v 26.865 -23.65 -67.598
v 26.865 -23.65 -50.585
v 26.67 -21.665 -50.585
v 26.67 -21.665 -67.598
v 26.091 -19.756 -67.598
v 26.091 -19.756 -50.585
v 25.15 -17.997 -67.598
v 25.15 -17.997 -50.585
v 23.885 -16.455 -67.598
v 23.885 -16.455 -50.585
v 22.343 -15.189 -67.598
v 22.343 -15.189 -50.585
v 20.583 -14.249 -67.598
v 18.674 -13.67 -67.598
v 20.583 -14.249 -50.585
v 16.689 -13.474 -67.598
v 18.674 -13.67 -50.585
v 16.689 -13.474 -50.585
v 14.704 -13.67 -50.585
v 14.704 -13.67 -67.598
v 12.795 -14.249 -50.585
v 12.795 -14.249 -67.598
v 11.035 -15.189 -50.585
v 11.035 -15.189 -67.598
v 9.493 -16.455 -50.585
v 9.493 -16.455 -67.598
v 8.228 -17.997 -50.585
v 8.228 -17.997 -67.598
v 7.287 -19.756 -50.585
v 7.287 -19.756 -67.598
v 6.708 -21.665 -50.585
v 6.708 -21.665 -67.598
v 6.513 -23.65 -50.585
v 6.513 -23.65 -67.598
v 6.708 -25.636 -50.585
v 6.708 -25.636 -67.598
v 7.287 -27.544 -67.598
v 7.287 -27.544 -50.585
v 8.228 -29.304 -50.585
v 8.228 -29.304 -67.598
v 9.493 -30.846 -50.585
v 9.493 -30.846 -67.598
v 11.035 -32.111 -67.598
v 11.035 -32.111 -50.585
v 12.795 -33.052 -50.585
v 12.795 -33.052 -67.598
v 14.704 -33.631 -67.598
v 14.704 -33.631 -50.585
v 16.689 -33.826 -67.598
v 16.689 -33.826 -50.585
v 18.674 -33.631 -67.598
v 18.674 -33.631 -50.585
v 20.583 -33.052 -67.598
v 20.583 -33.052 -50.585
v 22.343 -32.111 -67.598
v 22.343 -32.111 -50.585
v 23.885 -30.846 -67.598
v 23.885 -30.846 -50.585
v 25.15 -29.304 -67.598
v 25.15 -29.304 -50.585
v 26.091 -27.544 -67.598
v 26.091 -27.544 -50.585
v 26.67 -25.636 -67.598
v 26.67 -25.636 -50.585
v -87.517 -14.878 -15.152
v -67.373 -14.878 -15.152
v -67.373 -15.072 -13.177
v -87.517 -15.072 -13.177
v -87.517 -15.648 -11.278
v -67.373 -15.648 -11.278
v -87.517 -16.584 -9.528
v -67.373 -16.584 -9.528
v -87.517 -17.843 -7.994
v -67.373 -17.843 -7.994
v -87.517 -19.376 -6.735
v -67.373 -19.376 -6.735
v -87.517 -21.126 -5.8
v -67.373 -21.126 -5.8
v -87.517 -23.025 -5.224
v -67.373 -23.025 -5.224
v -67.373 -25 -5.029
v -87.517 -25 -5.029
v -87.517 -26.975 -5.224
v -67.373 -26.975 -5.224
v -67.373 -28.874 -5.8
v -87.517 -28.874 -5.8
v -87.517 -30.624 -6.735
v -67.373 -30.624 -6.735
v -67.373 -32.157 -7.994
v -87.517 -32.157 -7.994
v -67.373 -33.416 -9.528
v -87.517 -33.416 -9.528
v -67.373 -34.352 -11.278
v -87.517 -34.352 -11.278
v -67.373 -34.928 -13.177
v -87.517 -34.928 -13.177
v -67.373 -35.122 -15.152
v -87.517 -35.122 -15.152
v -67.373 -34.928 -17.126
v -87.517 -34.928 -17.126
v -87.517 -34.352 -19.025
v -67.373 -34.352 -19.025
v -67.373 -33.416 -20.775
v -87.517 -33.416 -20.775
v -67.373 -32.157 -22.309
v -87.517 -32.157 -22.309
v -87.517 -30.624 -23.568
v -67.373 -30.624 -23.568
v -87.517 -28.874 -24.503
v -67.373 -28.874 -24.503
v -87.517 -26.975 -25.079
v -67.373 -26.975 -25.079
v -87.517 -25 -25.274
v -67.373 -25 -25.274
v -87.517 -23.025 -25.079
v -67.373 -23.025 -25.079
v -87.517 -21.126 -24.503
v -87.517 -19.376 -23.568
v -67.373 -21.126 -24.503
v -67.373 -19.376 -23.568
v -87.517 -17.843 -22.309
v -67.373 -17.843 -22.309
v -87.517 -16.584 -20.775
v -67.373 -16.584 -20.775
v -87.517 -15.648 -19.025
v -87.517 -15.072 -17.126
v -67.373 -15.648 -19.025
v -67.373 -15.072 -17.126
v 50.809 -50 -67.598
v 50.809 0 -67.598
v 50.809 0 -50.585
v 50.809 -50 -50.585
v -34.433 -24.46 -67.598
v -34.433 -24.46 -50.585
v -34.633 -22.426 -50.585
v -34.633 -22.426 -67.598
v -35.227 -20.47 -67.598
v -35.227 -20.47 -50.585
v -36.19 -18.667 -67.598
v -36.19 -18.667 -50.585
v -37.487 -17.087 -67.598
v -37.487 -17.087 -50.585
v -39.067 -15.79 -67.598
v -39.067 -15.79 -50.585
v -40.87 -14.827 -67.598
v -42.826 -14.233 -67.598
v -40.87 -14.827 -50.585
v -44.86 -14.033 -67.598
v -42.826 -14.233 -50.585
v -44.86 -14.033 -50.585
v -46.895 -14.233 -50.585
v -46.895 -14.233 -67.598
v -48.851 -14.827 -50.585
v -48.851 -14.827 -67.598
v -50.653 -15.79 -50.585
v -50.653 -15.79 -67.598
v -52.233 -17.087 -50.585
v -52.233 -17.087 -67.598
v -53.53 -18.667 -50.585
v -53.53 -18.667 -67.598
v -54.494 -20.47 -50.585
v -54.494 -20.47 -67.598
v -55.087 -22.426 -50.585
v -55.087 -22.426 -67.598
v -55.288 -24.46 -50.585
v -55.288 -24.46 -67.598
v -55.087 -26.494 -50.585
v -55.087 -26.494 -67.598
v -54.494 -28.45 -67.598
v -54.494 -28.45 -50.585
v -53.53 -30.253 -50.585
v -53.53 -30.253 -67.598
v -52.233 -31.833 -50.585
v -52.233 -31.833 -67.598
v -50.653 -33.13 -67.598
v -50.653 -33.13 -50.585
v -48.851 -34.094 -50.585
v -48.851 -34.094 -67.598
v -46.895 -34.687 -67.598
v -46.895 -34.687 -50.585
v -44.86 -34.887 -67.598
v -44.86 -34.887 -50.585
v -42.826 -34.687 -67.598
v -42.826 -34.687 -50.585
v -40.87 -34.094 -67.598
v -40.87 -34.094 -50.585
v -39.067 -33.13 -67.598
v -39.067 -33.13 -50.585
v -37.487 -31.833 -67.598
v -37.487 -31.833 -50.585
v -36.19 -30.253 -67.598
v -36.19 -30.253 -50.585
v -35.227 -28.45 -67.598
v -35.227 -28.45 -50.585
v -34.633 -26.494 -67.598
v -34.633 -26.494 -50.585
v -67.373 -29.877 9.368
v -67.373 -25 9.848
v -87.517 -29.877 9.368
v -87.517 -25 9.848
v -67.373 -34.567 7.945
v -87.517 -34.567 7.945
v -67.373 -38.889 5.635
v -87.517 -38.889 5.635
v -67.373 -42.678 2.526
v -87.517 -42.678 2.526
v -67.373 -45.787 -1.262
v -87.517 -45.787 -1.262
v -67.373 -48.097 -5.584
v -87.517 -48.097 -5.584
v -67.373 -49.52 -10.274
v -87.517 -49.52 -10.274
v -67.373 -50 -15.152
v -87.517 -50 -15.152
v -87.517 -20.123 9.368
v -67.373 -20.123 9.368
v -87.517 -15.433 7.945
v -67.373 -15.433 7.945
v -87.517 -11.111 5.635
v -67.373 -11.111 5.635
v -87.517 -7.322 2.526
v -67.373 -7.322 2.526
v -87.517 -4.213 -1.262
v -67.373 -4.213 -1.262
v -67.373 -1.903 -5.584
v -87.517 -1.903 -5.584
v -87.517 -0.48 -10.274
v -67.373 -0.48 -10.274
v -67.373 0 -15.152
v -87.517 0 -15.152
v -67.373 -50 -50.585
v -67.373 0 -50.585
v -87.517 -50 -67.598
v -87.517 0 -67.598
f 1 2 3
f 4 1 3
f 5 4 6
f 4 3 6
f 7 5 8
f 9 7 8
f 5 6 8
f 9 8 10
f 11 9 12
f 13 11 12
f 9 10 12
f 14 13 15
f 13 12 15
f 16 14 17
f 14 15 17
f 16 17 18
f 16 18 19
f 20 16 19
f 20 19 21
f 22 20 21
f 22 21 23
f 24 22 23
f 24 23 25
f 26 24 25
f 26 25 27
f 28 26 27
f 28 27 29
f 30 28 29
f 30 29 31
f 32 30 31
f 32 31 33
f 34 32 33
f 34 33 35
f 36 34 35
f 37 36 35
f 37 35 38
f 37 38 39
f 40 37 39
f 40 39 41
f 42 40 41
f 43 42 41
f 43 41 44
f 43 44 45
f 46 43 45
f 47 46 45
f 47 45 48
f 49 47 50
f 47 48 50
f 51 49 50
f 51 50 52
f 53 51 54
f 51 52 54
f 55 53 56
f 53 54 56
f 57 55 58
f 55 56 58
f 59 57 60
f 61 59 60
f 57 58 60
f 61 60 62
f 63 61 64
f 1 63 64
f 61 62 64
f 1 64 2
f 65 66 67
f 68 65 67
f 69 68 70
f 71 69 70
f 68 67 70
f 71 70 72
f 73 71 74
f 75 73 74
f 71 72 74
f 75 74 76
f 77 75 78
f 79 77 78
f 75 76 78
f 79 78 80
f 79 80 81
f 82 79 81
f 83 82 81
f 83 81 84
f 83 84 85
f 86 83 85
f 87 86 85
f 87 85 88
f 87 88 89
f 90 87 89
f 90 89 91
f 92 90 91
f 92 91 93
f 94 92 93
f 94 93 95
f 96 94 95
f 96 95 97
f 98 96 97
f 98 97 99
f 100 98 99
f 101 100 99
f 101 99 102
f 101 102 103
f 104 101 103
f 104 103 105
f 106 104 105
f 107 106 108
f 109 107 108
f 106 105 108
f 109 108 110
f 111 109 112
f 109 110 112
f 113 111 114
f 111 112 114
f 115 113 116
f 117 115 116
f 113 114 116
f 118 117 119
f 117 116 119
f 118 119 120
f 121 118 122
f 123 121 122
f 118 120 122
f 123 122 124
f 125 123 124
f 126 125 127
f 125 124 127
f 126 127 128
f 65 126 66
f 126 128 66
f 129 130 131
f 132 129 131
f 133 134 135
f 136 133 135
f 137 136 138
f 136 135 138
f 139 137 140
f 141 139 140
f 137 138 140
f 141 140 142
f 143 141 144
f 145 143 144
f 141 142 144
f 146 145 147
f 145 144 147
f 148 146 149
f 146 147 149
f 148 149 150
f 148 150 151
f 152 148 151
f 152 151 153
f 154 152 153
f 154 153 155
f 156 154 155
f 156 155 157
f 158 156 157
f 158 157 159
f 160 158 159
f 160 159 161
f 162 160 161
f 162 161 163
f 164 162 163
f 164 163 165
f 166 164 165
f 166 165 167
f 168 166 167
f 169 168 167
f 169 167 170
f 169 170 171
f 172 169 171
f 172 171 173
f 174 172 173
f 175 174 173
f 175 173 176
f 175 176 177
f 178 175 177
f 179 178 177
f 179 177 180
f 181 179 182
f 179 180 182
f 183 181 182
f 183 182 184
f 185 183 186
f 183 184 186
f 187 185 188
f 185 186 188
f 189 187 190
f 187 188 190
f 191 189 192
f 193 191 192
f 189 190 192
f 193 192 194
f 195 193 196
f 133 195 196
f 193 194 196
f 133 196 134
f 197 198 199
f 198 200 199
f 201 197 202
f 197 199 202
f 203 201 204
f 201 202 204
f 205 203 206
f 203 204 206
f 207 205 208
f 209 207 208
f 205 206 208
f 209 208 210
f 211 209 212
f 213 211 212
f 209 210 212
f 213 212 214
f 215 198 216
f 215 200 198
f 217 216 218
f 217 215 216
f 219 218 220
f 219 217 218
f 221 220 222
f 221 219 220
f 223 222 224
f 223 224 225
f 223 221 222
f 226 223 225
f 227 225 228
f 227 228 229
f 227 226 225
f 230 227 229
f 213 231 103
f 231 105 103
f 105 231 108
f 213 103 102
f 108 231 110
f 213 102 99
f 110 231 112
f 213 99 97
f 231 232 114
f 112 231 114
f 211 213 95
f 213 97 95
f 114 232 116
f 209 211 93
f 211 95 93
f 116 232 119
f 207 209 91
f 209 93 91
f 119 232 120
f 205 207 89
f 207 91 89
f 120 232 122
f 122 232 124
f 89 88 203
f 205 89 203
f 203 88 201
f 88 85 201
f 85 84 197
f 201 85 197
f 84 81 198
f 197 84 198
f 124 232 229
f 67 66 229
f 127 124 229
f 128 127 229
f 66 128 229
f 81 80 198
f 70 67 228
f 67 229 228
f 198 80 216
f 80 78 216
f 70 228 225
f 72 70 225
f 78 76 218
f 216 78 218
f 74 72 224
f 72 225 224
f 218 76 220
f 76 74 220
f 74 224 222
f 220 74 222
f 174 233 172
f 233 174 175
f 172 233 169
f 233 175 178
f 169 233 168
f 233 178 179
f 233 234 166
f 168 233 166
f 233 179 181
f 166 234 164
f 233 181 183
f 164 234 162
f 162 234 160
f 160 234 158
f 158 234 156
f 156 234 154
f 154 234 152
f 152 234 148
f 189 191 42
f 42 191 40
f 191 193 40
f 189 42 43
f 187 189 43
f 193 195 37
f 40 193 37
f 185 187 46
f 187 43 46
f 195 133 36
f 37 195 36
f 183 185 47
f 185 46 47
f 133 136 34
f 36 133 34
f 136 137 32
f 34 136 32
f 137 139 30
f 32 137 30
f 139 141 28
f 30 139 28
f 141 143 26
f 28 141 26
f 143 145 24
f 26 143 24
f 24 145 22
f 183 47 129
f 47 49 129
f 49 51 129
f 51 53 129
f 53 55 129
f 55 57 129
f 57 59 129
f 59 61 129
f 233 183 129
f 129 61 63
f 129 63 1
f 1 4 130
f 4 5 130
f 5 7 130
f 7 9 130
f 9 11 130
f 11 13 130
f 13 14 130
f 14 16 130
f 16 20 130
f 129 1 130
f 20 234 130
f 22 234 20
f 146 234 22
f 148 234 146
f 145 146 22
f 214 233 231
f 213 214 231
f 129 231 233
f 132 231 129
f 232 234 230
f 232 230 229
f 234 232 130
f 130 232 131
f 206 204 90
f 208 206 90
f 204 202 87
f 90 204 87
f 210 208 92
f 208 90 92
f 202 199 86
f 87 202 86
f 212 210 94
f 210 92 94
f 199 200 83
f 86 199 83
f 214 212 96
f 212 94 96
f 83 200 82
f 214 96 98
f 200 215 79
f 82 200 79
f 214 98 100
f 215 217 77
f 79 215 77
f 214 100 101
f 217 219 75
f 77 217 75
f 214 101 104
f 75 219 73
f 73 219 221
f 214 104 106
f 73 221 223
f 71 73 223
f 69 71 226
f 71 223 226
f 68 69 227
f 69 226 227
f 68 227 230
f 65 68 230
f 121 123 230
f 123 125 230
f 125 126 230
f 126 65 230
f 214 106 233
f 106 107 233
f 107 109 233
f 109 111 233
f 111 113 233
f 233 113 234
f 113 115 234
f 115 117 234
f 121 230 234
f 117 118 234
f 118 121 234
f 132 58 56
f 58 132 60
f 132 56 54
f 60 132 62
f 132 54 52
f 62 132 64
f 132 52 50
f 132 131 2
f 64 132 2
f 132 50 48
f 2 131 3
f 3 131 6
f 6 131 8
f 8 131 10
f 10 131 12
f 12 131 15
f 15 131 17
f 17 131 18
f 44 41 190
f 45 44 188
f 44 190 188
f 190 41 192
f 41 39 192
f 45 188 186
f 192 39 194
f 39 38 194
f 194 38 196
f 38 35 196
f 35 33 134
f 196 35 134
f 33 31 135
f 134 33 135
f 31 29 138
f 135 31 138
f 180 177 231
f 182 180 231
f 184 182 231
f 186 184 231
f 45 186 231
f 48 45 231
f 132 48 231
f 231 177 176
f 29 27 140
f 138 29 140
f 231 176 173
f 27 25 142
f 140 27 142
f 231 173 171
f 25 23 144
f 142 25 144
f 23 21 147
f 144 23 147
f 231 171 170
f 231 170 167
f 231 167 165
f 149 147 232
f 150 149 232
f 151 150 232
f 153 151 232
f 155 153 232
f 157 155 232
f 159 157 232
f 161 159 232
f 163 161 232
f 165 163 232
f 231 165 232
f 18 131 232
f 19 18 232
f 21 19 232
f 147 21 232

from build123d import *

# Parameters (mm, degrees)
F1_DEPTH = 50
F2_R     = 24.99999
F3_R     = 10.4273095681
F3_R_2   = 10.1761827098
F4_DEPTH = 25
F5_R     = 10.1221707253
F6_DEPTH = 25


# Not quite as in the source:
# - a fillet or chamfer is up to 0.001 mm smaller than in the source, because OpenCascade refuses the exact size


with BuildPart() as f1:
    # F0 (on Front) → F1 (new body)
    with BuildSketch(Plane.XZ):
        Polygon((-87.5170975924, 9.8484745249), (-87.5170975924, -67.5976250101), (50.8091747761, -67.5976250101), (50.8091747761, -50.5853332579), (-67.3725008965, -50.5853332579), (-67.3725008965, 9.8484745249), align=None)
    extrude(amount=F1_DEPTH)

    # F2 (radius 25 in the source; OpenCascade refuses exactly that, so slightly less here)
    f2_edges = [f1.edges().sort_by_distance(p)[0] for p in [
        (-77.444799, -50, 9.848475),
        (-77.444799, 0, 9.848475),
    ]]
    fillet(f2_edges, radius=F2_R)

    # F3 (on face) → F4 (cut)
    with BuildSketch(Plane.XY.offset(-50.5853332579)):
        with Locations((-44.8602624238, -24.4600903243)):
            Circle(F3_R)
        with Locations((16.6889782995, -23.6502327025)):
            Circle(F3_R_2)
    extrude(amount=-F4_DEPTH, mode=Mode.SUBTRACT)

    # F5 (on face) → F6 (cut)
    with BuildSketch(Plane.YZ.offset(-67.3725008965)):
        with Locations((-25, -15.1515254751)):
            Circle(F5_R)
    extrude(amount=-F6_DEPTH, mode=Mode.SUBTRACT)


solid = f1.part
